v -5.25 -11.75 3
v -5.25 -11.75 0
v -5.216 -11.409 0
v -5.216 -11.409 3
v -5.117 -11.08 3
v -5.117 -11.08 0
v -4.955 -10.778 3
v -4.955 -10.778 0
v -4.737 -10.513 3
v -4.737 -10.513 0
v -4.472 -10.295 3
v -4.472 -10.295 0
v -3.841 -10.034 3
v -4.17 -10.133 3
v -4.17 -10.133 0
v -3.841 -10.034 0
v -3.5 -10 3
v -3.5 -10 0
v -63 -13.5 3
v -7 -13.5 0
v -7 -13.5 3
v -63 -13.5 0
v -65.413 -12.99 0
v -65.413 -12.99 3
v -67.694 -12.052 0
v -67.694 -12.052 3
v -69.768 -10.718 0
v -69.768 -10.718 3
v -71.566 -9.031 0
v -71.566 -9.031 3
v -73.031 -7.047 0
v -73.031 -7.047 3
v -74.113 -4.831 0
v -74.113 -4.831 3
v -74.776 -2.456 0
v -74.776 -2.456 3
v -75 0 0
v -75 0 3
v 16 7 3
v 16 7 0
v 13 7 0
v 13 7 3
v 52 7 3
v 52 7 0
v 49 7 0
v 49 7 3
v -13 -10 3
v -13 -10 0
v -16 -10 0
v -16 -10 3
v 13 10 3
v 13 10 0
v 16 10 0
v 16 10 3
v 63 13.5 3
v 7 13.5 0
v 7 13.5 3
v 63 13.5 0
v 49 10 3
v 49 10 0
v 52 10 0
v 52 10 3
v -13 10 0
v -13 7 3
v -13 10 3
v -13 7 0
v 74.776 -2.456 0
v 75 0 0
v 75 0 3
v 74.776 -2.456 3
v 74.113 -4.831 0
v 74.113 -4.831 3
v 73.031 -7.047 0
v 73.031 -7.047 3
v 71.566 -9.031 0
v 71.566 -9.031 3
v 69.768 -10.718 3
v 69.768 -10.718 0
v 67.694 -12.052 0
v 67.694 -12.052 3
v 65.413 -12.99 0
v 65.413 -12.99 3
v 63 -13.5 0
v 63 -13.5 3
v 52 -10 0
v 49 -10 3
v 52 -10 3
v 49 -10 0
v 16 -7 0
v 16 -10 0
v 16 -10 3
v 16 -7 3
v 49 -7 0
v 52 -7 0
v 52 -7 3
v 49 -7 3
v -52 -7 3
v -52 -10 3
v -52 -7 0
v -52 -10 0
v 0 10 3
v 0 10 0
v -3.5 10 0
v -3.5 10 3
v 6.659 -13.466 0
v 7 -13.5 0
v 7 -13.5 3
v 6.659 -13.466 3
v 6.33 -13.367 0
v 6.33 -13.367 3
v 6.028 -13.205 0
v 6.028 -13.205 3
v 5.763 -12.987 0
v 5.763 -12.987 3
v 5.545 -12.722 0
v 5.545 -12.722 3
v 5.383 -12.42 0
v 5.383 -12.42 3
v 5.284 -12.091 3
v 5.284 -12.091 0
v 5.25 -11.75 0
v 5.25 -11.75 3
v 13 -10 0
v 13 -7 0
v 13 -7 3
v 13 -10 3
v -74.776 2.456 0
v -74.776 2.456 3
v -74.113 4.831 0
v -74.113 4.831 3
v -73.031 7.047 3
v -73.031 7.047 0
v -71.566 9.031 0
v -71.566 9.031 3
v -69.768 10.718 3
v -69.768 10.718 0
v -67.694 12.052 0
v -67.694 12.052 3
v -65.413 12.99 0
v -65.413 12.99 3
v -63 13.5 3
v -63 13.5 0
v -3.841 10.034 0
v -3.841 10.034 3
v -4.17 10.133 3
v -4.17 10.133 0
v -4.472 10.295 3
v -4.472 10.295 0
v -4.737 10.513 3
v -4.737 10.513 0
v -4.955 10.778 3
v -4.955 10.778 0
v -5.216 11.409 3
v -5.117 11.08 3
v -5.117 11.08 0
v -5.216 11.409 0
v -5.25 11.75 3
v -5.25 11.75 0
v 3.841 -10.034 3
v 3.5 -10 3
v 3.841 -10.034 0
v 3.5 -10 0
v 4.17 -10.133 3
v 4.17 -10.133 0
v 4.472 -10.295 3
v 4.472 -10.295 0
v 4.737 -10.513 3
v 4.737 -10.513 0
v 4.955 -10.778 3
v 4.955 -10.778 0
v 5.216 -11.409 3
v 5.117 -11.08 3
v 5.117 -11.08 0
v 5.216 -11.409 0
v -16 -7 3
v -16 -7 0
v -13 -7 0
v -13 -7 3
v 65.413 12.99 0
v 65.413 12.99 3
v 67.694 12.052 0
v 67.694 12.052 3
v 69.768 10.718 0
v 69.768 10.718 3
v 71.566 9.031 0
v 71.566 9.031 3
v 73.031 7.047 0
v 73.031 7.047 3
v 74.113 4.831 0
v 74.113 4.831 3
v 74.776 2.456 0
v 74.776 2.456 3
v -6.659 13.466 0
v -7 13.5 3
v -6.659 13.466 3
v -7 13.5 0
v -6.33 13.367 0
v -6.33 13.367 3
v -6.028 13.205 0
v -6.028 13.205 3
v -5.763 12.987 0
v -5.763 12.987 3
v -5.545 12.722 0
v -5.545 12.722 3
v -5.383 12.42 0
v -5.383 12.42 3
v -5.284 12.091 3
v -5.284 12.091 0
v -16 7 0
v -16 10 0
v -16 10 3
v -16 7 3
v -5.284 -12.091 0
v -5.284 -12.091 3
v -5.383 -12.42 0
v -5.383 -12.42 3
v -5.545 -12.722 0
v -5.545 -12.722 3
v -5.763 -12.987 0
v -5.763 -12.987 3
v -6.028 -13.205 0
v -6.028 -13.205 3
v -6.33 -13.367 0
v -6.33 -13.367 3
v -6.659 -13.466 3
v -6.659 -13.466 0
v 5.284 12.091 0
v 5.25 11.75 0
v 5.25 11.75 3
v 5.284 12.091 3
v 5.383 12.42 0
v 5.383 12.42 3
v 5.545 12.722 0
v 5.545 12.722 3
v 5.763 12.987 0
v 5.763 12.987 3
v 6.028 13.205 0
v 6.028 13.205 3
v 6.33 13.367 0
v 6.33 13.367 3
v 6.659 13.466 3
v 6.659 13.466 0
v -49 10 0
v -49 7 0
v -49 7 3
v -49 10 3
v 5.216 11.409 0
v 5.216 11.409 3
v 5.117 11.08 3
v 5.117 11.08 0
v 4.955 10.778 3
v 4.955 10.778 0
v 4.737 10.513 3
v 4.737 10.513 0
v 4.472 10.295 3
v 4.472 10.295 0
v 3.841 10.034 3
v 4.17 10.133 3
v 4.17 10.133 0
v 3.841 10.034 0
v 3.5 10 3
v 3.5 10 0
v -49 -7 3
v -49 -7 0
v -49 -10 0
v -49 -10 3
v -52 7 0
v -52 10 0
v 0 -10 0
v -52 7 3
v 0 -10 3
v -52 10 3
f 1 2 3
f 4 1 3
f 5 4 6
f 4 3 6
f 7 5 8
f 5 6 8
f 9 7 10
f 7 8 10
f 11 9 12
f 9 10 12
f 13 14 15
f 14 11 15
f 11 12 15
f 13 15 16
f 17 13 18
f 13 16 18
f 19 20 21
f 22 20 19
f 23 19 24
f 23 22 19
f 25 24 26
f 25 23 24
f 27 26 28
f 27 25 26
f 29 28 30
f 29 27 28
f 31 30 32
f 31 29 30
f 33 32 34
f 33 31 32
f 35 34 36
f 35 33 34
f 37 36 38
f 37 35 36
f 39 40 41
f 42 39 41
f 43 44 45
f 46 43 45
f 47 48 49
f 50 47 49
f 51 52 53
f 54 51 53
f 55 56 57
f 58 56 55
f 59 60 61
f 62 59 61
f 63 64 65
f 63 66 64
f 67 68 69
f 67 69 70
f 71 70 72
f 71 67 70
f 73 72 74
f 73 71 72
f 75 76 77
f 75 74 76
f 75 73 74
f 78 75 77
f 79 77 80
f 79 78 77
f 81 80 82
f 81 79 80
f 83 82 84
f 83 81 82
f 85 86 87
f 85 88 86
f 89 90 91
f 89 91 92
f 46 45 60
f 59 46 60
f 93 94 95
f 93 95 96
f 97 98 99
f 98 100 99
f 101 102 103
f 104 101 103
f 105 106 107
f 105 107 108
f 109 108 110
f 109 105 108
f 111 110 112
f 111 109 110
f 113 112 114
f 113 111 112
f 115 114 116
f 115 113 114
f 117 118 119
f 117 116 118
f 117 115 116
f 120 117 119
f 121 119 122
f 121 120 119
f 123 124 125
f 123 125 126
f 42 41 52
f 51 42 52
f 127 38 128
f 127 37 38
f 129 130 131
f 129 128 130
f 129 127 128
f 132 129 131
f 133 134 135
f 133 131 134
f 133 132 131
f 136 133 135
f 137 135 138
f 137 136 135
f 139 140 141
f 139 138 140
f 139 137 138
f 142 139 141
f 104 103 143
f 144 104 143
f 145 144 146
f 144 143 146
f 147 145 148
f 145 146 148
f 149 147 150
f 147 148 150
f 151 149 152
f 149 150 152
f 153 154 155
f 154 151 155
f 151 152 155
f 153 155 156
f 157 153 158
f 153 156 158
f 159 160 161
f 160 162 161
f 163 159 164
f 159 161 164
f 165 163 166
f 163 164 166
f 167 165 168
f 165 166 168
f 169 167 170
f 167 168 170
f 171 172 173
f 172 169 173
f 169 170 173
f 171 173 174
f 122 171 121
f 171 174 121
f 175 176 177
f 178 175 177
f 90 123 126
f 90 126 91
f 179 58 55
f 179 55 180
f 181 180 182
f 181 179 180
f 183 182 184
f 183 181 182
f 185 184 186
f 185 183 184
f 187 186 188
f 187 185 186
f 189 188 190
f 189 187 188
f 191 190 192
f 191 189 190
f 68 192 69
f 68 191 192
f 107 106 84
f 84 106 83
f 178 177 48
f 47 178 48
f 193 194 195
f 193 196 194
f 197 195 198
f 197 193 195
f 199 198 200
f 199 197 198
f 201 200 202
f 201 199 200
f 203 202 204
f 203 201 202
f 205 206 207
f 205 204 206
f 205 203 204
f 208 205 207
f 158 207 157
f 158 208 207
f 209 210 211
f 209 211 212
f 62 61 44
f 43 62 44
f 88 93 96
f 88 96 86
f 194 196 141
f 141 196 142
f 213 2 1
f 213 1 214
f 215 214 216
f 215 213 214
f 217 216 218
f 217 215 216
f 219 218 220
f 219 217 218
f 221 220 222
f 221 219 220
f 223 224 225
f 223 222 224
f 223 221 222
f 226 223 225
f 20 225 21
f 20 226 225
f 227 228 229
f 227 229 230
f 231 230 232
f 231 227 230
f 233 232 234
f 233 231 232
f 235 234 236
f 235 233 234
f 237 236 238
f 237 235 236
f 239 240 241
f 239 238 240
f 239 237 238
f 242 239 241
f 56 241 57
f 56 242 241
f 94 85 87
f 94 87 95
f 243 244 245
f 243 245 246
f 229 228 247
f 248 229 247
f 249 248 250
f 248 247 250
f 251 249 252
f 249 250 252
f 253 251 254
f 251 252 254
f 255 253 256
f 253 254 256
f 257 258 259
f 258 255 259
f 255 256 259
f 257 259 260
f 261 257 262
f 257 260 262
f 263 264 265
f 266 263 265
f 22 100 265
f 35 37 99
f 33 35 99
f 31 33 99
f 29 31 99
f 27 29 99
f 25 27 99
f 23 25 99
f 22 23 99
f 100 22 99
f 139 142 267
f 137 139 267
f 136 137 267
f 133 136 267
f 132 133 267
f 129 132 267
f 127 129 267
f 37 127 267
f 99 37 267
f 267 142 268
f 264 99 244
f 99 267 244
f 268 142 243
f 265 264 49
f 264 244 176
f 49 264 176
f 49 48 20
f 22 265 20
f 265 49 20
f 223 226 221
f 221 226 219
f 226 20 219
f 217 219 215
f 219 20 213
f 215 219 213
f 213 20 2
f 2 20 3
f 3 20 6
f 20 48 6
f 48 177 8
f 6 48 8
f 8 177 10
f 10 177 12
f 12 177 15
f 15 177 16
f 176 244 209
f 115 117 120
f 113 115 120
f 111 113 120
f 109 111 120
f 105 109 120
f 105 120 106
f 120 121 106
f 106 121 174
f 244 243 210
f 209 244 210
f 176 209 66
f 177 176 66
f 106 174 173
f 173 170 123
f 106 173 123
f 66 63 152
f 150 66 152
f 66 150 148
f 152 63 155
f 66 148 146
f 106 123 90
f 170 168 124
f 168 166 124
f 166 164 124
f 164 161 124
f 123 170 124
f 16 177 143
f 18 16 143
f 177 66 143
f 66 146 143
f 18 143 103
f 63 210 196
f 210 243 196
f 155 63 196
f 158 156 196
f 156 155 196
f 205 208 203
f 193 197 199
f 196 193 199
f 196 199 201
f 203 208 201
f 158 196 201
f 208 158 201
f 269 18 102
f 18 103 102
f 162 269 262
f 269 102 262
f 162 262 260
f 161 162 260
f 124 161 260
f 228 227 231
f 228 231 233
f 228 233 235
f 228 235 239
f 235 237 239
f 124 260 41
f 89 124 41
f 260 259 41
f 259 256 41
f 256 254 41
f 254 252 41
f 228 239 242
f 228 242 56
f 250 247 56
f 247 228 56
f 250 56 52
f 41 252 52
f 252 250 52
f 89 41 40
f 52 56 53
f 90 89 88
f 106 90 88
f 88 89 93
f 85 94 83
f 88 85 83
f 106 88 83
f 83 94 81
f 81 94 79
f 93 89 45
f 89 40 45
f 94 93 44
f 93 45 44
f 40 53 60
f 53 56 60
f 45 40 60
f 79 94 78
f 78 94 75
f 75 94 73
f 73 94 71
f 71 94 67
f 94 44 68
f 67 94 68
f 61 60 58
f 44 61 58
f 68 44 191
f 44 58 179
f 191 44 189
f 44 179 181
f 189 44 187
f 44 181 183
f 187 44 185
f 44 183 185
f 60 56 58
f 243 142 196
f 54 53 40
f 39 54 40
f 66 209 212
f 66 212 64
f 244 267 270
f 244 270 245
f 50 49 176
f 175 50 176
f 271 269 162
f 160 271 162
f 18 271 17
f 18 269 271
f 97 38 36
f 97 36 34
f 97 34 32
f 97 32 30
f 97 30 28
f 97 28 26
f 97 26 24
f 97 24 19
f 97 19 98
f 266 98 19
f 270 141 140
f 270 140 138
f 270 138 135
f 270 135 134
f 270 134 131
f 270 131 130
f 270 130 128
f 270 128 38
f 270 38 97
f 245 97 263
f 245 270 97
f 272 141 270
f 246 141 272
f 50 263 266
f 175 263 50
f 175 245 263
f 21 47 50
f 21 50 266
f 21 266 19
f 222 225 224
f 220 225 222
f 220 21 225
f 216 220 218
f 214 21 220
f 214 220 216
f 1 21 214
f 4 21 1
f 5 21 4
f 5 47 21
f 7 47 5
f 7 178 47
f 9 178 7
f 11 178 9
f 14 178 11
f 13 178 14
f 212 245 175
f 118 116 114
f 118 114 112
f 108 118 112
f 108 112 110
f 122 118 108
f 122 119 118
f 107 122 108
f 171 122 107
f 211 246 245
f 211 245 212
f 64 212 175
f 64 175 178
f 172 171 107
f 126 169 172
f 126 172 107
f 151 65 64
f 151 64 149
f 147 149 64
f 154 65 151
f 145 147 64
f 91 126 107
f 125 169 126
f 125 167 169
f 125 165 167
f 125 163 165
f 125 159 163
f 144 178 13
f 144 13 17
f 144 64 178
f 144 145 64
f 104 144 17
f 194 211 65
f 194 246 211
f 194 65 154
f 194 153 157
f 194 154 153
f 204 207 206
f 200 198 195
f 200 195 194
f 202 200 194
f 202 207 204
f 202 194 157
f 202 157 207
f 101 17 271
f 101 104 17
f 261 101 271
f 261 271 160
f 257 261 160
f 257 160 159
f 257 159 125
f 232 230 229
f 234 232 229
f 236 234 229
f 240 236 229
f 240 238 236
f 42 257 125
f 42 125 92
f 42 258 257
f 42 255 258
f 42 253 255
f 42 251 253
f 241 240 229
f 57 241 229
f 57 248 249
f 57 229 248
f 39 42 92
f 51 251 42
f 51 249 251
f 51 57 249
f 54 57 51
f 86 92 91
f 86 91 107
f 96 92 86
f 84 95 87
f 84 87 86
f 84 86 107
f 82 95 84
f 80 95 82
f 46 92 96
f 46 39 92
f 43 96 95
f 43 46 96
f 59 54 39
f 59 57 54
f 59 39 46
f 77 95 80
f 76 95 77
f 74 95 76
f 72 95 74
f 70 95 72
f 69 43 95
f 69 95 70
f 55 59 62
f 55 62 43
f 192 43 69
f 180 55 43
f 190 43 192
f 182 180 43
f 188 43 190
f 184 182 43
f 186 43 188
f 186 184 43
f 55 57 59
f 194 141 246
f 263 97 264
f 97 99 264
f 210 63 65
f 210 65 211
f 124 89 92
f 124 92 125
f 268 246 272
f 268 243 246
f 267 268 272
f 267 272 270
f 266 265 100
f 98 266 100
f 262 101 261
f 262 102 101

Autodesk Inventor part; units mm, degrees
ref_plane "YZ Plane" through (0, 0, 0) normal (1, 0, 0) x (0, 1, 0)
ref_plane "XZ Plane" through (0, 0, 0) normal (0, 1, 0) x (-1, 0, 0)
ref_plane "XY Plane" through (0, 0, 0) normal (0, 0, 1) x (1, 0, 0)
sketch "Esboço1" plane through (0, 0, 0) normal (0, 0, 1) x (1, 0, 0)
  arc A0 (-63, 13.5) -> (-75, 0) centre (-61.4063, 0) ccw
  line L0 (0, 10) -> (-3.5, 10)
  arc A1 (-5.25, 11.75) -> (-7, 13.5) centre (-7, 11.75) ccw
  arc A2 (-5.25, 11.75) -> (-3.5, 10) centre (-3.5, 11.75) ccw
  line L1 (-7, 13.5) -> (-63, 13.5)
  line L2 (-49, 10) -> (-52, 10)
  line L3 (-52, 10) -> (-52, 7)
  line L4 (-52, 7) -> (-49, 7)
  line L5 (-49, 7) -> (-49, 10)
  line L6 (-13, 10) -> (-16, 10)
  line L7 (-16, 10) -> (-16, 7)
  line L8 (-16, 7) -> (-13, 7)
  line L9 (-13, 7) -> (-13, 10)
  line L10 (0, 10) -> (3.5, 10)
  arc A3 (3.5, 10) -> (5.25, 11.75) centre (3.5, 11.75) ccw
  arc A4 (7, 13.5) -> (5.25, 11.75) centre (7, 11.75) ccw
  line L11 (7, 13.5) -> (63, 13.5)
  arc A5 (75, 0) -> (63, 13.5) centre (61.4063, 0) ccw
  line L12 (49, 10) -> (52, 10)
  line L13 (52, 10) -> (52, 7)
  line L14 (52, 7) -> (49, 7)
  line L15 (49, 7) -> (49, 10)
  line L16 (13, 10) -> (16, 10)
  line L17 (16, 10) -> (16, 7)
  line L18 (16, 7) -> (13, 7)
  line L19 (13, 7) -> (13, 10)
  line L20 (0, -10) -> (-3.5, -10)
  arc A6 (-3.5, -10) -> (-5.25, -11.75) centre (-3.5, -11.75) ccw
  arc A7 (-7, -13.5) -> (-5.25, -11.75) centre (-7, -11.75) ccw
  line L21 (-7, -13.5) -> (-63, -13.5)
  arc A8 (-75, 0) -> (-63, -13.5) centre (-61.4063, 0) ccw
  line L22 (-49, -10) -> (-52, -10)
  line L23 (-52, -10) -> (-52, -7)
  line L24 (-52, -7) -> (-49, -7)
  line L25 (-49, -7) -> (-49, -10)
  line L26 (-13, -10) -> (-16, -10)
  line L27 (-16, -10) -> (-16, -7)
  line L28 (-16, -7) -> (-13, -7)
  line L29 (-13, -7) -> (-13, -10)
  arc A9 (63, -13.5) -> (75, 0) centre (61.4063, 0) ccw
  line L30 (52, -10) -> (52, -7)
  line L31 (49, -10) -> (52, -10)
  line L32 (52, -7) -> (49, -7)
  line L33 (49, -7) -> (49, -10)
  line L34 (7, -13.5) -> (63, -13.5)
  line L35 (16, -10) -> (16, -7)
  line L36 (16, -7) -> (13, -7)
  line L37 (13, -10) -> (16, -10)
  line L38 (13, -7) -> (13, -10)
  arc A10 (5.25, -11.75) -> (7, -13.5) centre (7, -11.75) ccw
  arc A11 (5.25, -11.75) -> (3.5, -10) centre (3.5, -11.75) ccw
  line L39 (0, -10) -> (3.5, -10)
  point P0 (0, 0)
  dimension "d6" = 3.5
extrude "Extrusão1" add sketch "Esboço1" along normal blind 3
properties part number "ASA_SUPERIOR"
